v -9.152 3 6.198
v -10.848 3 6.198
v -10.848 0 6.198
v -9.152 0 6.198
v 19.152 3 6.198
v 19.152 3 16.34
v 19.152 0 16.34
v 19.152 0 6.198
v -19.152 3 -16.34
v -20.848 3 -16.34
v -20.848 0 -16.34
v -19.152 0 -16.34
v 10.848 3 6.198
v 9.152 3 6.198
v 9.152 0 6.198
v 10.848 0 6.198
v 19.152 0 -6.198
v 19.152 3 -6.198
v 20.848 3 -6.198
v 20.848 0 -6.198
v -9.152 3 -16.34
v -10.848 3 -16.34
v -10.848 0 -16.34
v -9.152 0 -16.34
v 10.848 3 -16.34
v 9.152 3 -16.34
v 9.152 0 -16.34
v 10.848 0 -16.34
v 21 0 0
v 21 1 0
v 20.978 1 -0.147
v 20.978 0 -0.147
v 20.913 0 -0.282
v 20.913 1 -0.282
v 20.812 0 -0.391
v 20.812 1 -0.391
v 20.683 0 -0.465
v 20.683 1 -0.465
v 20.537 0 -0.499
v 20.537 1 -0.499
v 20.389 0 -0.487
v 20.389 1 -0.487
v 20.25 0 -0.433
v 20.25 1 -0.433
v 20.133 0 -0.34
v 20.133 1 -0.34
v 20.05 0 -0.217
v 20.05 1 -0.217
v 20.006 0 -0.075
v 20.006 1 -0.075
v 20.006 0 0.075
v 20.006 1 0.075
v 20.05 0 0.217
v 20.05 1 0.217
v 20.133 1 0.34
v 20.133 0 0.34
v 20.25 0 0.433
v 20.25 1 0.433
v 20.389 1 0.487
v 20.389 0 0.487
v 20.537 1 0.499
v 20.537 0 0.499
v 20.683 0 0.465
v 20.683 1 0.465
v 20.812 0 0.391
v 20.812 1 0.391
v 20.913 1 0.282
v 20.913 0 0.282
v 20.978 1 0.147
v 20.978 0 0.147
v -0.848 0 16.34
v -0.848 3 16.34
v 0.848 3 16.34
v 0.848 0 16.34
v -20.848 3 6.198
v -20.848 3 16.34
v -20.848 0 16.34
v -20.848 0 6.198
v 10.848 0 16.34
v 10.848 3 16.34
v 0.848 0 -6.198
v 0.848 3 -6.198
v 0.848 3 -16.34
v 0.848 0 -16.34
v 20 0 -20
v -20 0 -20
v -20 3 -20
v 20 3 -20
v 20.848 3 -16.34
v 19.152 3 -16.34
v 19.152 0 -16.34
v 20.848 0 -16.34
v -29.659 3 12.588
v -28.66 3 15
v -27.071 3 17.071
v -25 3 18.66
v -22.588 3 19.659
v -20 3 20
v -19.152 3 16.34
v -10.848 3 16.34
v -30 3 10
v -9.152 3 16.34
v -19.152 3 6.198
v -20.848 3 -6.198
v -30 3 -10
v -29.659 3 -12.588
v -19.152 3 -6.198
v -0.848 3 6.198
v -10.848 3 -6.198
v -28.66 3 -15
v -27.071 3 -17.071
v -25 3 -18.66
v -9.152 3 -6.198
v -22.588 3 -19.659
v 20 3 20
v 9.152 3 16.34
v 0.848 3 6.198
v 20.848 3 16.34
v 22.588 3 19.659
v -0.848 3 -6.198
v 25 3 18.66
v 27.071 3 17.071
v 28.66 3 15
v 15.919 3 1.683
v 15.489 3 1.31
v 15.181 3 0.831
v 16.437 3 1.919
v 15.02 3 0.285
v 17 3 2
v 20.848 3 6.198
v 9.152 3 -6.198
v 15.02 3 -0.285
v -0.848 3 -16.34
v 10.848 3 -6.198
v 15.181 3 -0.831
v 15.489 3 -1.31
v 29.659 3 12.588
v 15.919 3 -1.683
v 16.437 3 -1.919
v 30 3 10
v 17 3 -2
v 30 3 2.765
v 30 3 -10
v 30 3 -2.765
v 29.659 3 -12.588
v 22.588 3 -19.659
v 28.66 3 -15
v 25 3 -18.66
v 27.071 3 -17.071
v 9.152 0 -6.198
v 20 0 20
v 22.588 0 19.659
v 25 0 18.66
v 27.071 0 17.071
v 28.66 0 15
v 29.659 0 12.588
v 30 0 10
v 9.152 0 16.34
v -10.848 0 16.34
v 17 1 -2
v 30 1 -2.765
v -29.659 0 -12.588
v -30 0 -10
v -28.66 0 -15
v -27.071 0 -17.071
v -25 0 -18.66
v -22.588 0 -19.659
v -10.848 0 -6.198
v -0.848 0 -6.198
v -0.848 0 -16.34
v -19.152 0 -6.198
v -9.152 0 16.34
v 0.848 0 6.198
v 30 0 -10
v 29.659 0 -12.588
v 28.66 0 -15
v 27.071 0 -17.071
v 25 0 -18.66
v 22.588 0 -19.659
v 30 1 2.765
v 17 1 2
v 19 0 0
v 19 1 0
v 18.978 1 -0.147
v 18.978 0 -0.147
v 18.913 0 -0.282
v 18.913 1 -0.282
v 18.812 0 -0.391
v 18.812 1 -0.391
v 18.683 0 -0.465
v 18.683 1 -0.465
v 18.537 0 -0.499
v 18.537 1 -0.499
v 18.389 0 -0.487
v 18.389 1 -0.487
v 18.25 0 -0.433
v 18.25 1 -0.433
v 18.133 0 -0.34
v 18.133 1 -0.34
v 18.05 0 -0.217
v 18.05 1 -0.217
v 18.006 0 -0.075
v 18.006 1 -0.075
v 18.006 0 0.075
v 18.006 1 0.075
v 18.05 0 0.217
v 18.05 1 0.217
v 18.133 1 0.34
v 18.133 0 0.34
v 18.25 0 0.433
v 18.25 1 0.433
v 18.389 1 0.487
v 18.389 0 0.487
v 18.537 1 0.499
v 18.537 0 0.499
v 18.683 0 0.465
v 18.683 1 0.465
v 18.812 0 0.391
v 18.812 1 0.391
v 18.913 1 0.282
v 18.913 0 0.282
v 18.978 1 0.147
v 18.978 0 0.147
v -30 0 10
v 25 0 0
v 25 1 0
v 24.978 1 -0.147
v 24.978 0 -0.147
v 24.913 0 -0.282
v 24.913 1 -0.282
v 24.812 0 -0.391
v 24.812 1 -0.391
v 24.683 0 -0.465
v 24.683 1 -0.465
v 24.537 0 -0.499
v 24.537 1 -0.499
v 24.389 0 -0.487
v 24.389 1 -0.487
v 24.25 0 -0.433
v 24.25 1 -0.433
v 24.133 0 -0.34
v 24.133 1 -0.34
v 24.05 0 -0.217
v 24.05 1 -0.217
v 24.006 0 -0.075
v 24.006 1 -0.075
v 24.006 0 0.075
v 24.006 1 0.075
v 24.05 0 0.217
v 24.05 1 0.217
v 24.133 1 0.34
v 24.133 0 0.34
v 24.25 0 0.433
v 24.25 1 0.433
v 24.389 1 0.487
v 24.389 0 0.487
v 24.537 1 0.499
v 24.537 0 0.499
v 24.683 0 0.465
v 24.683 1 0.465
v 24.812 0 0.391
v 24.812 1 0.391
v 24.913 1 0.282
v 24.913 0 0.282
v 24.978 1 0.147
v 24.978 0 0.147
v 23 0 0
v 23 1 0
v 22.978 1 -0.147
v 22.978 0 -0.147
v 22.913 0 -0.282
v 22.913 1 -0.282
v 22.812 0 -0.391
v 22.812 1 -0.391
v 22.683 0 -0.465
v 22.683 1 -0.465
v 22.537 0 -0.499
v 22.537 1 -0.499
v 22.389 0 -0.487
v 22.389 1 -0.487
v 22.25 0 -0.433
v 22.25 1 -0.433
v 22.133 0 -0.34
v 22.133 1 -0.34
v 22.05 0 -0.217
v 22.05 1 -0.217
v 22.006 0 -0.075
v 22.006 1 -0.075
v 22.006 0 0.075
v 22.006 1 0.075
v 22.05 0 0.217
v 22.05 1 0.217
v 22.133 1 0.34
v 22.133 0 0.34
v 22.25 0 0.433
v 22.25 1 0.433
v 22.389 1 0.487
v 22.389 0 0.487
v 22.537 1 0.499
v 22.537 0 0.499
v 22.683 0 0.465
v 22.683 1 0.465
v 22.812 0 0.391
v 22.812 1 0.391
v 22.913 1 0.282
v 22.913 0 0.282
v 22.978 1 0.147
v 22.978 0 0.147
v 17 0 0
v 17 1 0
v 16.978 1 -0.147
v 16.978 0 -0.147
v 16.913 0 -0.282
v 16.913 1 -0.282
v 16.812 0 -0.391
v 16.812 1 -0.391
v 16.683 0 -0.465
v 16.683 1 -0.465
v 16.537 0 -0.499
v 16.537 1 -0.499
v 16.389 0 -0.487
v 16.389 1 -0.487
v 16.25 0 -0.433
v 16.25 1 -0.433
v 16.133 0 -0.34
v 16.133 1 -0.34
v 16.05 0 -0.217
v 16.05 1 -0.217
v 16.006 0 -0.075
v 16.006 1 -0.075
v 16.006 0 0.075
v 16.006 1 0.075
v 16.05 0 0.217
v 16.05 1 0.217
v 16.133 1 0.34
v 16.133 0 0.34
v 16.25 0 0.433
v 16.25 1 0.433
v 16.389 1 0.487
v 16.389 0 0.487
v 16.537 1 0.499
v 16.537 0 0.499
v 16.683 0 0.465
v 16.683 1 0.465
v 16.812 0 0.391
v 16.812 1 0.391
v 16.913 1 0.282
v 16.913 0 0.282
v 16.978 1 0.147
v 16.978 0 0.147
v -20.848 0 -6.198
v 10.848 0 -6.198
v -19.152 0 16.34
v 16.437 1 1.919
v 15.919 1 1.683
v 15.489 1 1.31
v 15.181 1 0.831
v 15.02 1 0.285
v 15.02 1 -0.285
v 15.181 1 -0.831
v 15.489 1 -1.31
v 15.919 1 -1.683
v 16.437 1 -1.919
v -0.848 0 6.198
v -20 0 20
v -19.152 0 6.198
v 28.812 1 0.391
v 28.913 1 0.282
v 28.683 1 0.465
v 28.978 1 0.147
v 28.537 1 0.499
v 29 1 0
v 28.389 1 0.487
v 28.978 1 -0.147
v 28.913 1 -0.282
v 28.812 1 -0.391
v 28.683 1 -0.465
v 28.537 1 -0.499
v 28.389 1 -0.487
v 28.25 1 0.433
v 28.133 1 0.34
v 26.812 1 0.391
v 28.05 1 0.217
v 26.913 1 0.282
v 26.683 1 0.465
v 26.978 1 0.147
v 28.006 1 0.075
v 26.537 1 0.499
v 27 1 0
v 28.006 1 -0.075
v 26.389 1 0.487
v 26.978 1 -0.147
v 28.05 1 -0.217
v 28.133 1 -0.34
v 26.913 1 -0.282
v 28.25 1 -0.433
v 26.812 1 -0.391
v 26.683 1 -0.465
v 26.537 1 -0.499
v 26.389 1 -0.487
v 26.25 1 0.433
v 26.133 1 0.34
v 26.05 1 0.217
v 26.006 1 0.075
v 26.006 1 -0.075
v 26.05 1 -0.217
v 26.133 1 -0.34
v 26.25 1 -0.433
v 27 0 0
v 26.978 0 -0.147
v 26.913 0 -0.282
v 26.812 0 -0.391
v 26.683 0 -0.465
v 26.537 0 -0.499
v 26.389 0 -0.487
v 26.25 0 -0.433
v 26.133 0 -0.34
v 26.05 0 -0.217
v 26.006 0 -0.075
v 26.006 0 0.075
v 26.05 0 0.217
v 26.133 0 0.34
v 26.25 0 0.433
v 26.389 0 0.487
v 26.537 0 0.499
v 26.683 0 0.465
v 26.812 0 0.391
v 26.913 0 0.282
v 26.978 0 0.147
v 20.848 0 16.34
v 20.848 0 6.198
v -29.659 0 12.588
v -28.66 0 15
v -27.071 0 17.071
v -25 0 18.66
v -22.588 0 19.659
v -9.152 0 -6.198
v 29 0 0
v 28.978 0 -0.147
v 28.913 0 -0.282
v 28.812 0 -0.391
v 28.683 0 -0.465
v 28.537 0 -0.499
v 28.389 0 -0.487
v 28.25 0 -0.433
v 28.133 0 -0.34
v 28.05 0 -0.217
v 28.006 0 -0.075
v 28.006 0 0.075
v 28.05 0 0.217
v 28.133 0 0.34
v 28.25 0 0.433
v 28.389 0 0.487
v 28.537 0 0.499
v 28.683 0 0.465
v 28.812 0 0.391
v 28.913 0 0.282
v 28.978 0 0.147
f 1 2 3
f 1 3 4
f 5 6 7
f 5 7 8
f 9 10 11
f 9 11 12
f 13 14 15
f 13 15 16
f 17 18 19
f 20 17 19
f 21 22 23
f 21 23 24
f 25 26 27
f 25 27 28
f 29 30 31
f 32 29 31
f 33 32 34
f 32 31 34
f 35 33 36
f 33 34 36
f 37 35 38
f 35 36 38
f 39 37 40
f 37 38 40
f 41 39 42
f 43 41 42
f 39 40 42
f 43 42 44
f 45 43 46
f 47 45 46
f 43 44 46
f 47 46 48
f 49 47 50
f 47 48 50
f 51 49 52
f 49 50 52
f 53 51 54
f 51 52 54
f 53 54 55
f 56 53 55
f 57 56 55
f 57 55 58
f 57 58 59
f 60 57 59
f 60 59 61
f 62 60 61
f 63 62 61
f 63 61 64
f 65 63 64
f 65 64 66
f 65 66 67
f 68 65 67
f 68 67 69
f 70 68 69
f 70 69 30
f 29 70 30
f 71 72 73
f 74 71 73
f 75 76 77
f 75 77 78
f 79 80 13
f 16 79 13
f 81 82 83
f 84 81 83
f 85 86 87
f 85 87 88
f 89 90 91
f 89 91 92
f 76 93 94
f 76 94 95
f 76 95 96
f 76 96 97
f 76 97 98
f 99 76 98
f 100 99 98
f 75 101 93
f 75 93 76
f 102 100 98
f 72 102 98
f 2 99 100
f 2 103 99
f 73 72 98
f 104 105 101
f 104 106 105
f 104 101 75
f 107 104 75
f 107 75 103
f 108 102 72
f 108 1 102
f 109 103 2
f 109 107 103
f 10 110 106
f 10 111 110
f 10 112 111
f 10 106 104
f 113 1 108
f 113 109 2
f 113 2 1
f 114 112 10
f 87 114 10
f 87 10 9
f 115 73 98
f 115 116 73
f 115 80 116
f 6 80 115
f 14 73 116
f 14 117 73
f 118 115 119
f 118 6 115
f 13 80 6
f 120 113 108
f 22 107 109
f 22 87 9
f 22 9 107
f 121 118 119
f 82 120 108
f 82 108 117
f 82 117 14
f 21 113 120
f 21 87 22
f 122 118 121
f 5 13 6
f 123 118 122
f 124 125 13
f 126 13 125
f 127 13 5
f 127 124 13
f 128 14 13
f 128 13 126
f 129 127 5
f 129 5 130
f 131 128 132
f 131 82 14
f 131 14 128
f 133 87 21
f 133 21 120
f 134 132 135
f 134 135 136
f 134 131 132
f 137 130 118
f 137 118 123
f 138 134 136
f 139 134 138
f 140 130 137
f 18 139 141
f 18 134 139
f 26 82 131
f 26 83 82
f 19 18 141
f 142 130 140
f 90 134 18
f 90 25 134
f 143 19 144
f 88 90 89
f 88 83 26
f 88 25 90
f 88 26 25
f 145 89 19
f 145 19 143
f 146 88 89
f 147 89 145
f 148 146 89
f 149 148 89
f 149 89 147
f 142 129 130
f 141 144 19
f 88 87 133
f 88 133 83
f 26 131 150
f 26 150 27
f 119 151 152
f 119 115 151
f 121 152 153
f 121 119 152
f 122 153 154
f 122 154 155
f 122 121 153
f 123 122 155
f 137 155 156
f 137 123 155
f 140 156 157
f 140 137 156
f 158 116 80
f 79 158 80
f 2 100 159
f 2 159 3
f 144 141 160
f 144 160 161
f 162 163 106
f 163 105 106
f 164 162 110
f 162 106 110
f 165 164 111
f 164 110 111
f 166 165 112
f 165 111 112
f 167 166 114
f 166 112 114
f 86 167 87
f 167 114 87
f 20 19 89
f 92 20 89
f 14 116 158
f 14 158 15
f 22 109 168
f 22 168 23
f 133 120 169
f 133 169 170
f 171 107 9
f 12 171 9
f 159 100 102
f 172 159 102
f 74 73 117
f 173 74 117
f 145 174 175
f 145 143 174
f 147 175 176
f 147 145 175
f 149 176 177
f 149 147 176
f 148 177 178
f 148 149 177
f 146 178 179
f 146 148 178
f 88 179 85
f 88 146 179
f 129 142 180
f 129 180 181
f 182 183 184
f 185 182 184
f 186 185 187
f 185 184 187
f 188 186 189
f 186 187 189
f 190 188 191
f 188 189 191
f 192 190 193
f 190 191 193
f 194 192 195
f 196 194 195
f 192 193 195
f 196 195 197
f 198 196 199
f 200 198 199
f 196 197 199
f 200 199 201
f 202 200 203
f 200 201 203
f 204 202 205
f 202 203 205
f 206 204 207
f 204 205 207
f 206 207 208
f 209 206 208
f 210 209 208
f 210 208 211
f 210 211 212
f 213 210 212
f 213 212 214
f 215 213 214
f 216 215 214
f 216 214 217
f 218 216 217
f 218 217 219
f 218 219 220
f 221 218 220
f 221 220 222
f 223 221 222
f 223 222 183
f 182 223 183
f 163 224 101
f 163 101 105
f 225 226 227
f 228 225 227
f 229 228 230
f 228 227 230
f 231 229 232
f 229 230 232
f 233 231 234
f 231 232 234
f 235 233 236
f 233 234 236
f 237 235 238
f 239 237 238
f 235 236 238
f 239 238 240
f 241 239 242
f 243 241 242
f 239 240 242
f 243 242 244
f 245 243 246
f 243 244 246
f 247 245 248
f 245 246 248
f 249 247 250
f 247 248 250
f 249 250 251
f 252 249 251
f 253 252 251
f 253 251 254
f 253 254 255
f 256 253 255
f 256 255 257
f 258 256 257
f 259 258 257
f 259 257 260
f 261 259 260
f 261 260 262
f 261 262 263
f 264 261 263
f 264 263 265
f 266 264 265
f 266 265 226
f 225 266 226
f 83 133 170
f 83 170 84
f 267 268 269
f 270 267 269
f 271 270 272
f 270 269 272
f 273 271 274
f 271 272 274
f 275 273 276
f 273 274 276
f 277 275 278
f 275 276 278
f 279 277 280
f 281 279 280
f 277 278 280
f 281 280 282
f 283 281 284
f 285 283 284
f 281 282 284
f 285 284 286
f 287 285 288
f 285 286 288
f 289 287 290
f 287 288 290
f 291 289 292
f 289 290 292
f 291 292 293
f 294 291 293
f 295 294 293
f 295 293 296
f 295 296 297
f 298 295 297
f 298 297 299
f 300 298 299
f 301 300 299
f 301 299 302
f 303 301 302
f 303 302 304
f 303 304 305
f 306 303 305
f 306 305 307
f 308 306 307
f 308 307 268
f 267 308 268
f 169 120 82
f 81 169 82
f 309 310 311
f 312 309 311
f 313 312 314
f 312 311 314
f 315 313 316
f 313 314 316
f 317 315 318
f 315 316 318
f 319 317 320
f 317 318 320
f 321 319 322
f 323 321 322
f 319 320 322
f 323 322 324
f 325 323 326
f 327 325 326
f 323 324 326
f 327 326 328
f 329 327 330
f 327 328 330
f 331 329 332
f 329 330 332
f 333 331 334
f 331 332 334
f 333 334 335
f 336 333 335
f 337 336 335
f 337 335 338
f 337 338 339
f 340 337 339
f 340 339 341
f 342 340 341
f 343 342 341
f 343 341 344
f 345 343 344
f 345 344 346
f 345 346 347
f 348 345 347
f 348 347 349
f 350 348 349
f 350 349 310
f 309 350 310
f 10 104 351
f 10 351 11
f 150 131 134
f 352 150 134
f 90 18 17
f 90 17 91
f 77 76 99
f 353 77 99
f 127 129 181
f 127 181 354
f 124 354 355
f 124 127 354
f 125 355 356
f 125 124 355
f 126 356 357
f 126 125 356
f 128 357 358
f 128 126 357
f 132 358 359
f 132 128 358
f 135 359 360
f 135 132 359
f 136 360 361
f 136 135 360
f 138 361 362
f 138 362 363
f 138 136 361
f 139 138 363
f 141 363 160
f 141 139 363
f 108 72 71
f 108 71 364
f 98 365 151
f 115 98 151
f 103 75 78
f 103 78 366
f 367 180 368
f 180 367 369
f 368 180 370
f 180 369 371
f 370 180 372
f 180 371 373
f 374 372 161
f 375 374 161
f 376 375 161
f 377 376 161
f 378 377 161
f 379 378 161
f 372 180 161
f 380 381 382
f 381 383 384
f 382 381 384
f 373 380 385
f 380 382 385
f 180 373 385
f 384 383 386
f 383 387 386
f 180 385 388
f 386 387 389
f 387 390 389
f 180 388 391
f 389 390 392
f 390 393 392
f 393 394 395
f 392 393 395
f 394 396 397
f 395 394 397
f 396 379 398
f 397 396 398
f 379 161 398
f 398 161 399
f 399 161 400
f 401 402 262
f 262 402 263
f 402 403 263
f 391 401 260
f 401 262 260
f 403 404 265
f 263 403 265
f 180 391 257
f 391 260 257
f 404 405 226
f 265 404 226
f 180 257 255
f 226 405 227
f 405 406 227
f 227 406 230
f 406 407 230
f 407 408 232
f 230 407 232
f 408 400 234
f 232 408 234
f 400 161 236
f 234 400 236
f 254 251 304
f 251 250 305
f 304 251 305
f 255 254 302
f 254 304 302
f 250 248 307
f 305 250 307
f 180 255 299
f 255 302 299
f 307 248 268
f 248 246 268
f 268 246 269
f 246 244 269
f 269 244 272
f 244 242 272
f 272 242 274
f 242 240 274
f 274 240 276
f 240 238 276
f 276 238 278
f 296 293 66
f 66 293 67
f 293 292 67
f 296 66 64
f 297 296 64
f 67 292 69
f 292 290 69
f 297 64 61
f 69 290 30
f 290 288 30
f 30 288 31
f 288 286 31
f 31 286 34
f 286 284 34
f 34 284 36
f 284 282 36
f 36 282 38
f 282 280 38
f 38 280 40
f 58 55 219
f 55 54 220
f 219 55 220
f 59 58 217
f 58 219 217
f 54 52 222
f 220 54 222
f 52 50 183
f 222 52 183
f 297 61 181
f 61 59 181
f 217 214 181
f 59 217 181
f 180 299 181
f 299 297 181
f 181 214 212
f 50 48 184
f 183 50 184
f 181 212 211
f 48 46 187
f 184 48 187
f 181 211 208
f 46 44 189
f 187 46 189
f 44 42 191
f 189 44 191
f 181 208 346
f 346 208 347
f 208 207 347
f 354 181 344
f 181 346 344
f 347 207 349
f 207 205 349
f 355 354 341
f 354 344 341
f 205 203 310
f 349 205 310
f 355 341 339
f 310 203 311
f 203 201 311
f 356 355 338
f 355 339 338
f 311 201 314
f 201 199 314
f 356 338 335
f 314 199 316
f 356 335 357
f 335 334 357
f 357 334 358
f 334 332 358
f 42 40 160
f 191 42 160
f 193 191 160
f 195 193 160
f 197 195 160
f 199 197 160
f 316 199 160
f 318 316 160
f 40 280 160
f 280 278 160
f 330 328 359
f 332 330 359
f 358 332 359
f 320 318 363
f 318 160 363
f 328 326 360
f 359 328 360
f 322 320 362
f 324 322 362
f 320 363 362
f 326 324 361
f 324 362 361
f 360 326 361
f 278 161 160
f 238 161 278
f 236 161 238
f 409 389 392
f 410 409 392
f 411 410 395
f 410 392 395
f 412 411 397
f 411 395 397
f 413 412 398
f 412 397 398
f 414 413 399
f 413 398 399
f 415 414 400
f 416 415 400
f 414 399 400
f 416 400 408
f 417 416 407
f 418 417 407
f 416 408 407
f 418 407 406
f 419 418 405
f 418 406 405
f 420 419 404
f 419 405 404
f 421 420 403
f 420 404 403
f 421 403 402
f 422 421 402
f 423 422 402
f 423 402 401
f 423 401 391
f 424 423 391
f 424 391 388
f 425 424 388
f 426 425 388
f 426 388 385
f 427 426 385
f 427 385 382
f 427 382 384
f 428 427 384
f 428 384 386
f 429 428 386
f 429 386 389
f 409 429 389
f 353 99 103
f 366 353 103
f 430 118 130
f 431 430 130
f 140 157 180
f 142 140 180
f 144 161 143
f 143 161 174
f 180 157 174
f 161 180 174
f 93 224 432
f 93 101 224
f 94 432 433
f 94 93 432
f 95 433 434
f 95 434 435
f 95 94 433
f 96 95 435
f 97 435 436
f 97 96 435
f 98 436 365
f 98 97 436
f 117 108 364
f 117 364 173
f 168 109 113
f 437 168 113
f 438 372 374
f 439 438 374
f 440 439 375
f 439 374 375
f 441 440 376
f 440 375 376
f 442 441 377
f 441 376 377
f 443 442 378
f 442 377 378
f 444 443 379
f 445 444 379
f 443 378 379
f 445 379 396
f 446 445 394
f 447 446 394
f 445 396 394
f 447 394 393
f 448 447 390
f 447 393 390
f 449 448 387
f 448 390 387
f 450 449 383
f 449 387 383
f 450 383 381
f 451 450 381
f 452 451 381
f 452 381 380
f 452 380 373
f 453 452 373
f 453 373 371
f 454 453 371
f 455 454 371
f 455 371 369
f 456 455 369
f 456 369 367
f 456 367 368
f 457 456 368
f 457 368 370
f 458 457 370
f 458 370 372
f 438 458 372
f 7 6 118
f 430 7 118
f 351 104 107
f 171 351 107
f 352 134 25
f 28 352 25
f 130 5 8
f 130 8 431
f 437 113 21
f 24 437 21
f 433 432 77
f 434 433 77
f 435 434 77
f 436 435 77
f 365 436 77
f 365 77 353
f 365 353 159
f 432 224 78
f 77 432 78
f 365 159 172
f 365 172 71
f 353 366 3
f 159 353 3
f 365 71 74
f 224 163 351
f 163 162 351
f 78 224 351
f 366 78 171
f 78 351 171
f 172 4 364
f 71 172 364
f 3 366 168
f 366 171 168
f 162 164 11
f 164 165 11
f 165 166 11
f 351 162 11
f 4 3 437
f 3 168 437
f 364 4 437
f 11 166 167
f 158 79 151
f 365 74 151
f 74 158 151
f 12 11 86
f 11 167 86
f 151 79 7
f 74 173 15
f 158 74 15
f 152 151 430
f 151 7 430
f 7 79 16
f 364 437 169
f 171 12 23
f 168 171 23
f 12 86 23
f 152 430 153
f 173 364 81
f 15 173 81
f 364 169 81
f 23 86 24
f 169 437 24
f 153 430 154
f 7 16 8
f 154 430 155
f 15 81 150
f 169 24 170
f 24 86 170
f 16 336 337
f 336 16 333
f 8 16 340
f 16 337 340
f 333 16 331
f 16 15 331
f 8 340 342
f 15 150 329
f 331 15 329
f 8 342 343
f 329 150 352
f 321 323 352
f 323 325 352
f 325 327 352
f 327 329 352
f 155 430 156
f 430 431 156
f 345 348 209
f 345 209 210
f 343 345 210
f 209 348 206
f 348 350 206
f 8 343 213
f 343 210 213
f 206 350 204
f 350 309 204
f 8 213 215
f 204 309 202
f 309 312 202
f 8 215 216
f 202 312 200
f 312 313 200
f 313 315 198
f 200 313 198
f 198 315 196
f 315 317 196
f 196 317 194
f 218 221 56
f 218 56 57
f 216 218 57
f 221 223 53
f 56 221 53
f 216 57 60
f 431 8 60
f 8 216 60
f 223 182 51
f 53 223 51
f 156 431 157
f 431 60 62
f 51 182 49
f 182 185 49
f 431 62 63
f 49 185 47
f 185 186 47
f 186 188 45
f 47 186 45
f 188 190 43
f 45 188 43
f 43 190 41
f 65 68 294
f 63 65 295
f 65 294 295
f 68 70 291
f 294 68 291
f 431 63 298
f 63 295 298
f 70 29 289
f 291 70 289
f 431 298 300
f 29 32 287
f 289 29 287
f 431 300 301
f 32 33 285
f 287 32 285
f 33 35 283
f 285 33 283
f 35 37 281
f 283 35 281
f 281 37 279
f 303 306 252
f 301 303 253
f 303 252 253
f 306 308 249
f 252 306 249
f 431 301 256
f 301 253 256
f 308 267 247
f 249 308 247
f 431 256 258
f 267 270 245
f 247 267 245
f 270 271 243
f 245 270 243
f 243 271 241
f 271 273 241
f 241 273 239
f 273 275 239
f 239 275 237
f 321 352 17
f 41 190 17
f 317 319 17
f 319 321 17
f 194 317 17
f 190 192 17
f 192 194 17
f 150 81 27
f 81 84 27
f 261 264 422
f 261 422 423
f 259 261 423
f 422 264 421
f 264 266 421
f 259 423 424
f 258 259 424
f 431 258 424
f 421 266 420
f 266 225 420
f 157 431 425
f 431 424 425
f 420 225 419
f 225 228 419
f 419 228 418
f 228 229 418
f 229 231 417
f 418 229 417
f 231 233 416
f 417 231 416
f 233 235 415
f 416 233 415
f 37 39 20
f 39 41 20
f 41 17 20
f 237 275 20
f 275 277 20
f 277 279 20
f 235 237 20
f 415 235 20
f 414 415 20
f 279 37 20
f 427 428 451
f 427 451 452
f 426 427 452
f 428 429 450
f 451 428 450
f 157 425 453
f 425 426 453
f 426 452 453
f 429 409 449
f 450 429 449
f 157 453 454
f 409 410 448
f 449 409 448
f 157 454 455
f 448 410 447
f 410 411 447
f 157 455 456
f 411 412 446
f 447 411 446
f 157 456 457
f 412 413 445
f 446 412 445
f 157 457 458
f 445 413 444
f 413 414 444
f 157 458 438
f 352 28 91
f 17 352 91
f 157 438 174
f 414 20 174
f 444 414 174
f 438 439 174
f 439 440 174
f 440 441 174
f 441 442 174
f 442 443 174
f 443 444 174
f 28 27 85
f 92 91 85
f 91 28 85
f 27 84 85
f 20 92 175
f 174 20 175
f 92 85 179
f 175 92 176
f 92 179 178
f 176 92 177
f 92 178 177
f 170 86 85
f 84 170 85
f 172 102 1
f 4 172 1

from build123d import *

# Parameters (mm, degrees)
SKETCH_1_W          = 60
SKETCH_1_H          = 40
EXTRUDE_1_DEPTH     = 3
FILLET_1_R          = 10
SKETCH_2_W          = 1.695959674
SKETCH_2_H          = 10.142260461
CUT_EXTRUDE_1_DEPTH = 4
CUT_EXTRUDE_2_DEPTH = 2
SKETCH_4_R          = 0.5
CUT_EXTRUDE_3_DEPTH = 2


with BuildPart() as part:
    # 草图1 → 凸台-拉伸1 (new body)
    with BuildSketch(Plane(origin=(0, 0, 0), x_dir=(1, 0, 0), z_dir=(0, 1, 0))):
        Rectangle(SKETCH_1_W, SKETCH_1_H)
    extrude(amount=EXTRUDE_1_DEPTH)

    # 圆角1
    fillet_1_edges = [part.edges().sort_by_distance(p)[0] for p in [
        (30, 1.5, 20),
        (-30, 1.5, 20),
        (-30, 1.5, -20),
        (30, 1.5, -20),
    ]]
    fillet(fillet_1_edges, radius=FILLET_1_R)

    # 草图2 → 切除-拉伸1 (cut, through all)
    with BuildSketch(Plane(origin=(0, 3, 0), x_dir=(1, 0, 0), z_dir=(0, 1, 0))):
        with Locations((-20, 11.269178291)):
            Rectangle(SKETCH_2_W, SKETCH_2_H)
        with Locations((-10, 11.269178291)):
            Rectangle(SKETCH_2_W, SKETCH_2_H)
        with Locations((0, 11.269178291)):
            Rectangle(SKETCH_2_W, SKETCH_2_H)
        with Locations((10, 11.269178291)):
            Rectangle(SKETCH_2_W, SKETCH_2_H)
        with Locations((20, 11.269178291)):
            Rectangle(SKETCH_2_W, SKETCH_2_H)
        with Locations((20, -11.269178291)):
            Rectangle(SKETCH_2_W, SKETCH_2_H)
        with Locations((10, -11.269178291)):
            Rectangle(SKETCH_2_W, SKETCH_2_H)
        with Locations((0, -11.269178291)):
            Rectangle(SKETCH_2_W, SKETCH_2_H)
        with Locations((-10, -11.269178291)):
            Rectangle(SKETCH_2_W, SKETCH_2_H)
        with Locations((-20, -11.269178291)):
            Rectangle(SKETCH_2_W, SKETCH_2_H)
    extrude(amount=-CUT_EXTRUDE_1_DEPTH, mode=Mode.SUBTRACT)

    # 草图3 → 切除-拉伸2 (cut)
    with BuildSketch(Plane(origin=(0, 3, 0), x_dir=(1, 0, 0), z_dir=(0, 1, 0))):
        with BuildLine():
            Line((34, 3), (34, -3))
            Line((34, -3), (17, -2))
            ThreePointArc((17, -2), (15, 0), (17, 2))
            Line((17, 2), (34, 3))
        make_face()
    extrude(amount=-CUT_EXTRUDE_2_DEPTH, mode=Mode.SUBTRACT)

    # 草图4 → 切除-拉伸3 (cut, through all)
    with BuildSketch(Plane(origin=(0, 1, 0), x_dir=(1, 0, 0), z_dir=(0, 1, 0))):
        with Locations((16.5, 0)):
            Circle(SKETCH_4_R)
        with Locations((18.5, 0)):
            Circle(SKETCH_4_R)
        with Locations((20.5, 0)):
            Circle(SKETCH_4_R)
        with Locations((22.5, 0)):
            Circle(SKETCH_4_R)
        with Locations((24.5, 0)):
            Circle(SKETCH_4_R)
        with Locations((26.5, 0)):
            Circle(SKETCH_4_R)
        with Locations((28.5, 0)):
            Circle(SKETCH_4_R)
    extrude(amount=-CUT_EXTRUDE_3_DEPTH, mode=Mode.SUBTRACT)


solid = part.part
